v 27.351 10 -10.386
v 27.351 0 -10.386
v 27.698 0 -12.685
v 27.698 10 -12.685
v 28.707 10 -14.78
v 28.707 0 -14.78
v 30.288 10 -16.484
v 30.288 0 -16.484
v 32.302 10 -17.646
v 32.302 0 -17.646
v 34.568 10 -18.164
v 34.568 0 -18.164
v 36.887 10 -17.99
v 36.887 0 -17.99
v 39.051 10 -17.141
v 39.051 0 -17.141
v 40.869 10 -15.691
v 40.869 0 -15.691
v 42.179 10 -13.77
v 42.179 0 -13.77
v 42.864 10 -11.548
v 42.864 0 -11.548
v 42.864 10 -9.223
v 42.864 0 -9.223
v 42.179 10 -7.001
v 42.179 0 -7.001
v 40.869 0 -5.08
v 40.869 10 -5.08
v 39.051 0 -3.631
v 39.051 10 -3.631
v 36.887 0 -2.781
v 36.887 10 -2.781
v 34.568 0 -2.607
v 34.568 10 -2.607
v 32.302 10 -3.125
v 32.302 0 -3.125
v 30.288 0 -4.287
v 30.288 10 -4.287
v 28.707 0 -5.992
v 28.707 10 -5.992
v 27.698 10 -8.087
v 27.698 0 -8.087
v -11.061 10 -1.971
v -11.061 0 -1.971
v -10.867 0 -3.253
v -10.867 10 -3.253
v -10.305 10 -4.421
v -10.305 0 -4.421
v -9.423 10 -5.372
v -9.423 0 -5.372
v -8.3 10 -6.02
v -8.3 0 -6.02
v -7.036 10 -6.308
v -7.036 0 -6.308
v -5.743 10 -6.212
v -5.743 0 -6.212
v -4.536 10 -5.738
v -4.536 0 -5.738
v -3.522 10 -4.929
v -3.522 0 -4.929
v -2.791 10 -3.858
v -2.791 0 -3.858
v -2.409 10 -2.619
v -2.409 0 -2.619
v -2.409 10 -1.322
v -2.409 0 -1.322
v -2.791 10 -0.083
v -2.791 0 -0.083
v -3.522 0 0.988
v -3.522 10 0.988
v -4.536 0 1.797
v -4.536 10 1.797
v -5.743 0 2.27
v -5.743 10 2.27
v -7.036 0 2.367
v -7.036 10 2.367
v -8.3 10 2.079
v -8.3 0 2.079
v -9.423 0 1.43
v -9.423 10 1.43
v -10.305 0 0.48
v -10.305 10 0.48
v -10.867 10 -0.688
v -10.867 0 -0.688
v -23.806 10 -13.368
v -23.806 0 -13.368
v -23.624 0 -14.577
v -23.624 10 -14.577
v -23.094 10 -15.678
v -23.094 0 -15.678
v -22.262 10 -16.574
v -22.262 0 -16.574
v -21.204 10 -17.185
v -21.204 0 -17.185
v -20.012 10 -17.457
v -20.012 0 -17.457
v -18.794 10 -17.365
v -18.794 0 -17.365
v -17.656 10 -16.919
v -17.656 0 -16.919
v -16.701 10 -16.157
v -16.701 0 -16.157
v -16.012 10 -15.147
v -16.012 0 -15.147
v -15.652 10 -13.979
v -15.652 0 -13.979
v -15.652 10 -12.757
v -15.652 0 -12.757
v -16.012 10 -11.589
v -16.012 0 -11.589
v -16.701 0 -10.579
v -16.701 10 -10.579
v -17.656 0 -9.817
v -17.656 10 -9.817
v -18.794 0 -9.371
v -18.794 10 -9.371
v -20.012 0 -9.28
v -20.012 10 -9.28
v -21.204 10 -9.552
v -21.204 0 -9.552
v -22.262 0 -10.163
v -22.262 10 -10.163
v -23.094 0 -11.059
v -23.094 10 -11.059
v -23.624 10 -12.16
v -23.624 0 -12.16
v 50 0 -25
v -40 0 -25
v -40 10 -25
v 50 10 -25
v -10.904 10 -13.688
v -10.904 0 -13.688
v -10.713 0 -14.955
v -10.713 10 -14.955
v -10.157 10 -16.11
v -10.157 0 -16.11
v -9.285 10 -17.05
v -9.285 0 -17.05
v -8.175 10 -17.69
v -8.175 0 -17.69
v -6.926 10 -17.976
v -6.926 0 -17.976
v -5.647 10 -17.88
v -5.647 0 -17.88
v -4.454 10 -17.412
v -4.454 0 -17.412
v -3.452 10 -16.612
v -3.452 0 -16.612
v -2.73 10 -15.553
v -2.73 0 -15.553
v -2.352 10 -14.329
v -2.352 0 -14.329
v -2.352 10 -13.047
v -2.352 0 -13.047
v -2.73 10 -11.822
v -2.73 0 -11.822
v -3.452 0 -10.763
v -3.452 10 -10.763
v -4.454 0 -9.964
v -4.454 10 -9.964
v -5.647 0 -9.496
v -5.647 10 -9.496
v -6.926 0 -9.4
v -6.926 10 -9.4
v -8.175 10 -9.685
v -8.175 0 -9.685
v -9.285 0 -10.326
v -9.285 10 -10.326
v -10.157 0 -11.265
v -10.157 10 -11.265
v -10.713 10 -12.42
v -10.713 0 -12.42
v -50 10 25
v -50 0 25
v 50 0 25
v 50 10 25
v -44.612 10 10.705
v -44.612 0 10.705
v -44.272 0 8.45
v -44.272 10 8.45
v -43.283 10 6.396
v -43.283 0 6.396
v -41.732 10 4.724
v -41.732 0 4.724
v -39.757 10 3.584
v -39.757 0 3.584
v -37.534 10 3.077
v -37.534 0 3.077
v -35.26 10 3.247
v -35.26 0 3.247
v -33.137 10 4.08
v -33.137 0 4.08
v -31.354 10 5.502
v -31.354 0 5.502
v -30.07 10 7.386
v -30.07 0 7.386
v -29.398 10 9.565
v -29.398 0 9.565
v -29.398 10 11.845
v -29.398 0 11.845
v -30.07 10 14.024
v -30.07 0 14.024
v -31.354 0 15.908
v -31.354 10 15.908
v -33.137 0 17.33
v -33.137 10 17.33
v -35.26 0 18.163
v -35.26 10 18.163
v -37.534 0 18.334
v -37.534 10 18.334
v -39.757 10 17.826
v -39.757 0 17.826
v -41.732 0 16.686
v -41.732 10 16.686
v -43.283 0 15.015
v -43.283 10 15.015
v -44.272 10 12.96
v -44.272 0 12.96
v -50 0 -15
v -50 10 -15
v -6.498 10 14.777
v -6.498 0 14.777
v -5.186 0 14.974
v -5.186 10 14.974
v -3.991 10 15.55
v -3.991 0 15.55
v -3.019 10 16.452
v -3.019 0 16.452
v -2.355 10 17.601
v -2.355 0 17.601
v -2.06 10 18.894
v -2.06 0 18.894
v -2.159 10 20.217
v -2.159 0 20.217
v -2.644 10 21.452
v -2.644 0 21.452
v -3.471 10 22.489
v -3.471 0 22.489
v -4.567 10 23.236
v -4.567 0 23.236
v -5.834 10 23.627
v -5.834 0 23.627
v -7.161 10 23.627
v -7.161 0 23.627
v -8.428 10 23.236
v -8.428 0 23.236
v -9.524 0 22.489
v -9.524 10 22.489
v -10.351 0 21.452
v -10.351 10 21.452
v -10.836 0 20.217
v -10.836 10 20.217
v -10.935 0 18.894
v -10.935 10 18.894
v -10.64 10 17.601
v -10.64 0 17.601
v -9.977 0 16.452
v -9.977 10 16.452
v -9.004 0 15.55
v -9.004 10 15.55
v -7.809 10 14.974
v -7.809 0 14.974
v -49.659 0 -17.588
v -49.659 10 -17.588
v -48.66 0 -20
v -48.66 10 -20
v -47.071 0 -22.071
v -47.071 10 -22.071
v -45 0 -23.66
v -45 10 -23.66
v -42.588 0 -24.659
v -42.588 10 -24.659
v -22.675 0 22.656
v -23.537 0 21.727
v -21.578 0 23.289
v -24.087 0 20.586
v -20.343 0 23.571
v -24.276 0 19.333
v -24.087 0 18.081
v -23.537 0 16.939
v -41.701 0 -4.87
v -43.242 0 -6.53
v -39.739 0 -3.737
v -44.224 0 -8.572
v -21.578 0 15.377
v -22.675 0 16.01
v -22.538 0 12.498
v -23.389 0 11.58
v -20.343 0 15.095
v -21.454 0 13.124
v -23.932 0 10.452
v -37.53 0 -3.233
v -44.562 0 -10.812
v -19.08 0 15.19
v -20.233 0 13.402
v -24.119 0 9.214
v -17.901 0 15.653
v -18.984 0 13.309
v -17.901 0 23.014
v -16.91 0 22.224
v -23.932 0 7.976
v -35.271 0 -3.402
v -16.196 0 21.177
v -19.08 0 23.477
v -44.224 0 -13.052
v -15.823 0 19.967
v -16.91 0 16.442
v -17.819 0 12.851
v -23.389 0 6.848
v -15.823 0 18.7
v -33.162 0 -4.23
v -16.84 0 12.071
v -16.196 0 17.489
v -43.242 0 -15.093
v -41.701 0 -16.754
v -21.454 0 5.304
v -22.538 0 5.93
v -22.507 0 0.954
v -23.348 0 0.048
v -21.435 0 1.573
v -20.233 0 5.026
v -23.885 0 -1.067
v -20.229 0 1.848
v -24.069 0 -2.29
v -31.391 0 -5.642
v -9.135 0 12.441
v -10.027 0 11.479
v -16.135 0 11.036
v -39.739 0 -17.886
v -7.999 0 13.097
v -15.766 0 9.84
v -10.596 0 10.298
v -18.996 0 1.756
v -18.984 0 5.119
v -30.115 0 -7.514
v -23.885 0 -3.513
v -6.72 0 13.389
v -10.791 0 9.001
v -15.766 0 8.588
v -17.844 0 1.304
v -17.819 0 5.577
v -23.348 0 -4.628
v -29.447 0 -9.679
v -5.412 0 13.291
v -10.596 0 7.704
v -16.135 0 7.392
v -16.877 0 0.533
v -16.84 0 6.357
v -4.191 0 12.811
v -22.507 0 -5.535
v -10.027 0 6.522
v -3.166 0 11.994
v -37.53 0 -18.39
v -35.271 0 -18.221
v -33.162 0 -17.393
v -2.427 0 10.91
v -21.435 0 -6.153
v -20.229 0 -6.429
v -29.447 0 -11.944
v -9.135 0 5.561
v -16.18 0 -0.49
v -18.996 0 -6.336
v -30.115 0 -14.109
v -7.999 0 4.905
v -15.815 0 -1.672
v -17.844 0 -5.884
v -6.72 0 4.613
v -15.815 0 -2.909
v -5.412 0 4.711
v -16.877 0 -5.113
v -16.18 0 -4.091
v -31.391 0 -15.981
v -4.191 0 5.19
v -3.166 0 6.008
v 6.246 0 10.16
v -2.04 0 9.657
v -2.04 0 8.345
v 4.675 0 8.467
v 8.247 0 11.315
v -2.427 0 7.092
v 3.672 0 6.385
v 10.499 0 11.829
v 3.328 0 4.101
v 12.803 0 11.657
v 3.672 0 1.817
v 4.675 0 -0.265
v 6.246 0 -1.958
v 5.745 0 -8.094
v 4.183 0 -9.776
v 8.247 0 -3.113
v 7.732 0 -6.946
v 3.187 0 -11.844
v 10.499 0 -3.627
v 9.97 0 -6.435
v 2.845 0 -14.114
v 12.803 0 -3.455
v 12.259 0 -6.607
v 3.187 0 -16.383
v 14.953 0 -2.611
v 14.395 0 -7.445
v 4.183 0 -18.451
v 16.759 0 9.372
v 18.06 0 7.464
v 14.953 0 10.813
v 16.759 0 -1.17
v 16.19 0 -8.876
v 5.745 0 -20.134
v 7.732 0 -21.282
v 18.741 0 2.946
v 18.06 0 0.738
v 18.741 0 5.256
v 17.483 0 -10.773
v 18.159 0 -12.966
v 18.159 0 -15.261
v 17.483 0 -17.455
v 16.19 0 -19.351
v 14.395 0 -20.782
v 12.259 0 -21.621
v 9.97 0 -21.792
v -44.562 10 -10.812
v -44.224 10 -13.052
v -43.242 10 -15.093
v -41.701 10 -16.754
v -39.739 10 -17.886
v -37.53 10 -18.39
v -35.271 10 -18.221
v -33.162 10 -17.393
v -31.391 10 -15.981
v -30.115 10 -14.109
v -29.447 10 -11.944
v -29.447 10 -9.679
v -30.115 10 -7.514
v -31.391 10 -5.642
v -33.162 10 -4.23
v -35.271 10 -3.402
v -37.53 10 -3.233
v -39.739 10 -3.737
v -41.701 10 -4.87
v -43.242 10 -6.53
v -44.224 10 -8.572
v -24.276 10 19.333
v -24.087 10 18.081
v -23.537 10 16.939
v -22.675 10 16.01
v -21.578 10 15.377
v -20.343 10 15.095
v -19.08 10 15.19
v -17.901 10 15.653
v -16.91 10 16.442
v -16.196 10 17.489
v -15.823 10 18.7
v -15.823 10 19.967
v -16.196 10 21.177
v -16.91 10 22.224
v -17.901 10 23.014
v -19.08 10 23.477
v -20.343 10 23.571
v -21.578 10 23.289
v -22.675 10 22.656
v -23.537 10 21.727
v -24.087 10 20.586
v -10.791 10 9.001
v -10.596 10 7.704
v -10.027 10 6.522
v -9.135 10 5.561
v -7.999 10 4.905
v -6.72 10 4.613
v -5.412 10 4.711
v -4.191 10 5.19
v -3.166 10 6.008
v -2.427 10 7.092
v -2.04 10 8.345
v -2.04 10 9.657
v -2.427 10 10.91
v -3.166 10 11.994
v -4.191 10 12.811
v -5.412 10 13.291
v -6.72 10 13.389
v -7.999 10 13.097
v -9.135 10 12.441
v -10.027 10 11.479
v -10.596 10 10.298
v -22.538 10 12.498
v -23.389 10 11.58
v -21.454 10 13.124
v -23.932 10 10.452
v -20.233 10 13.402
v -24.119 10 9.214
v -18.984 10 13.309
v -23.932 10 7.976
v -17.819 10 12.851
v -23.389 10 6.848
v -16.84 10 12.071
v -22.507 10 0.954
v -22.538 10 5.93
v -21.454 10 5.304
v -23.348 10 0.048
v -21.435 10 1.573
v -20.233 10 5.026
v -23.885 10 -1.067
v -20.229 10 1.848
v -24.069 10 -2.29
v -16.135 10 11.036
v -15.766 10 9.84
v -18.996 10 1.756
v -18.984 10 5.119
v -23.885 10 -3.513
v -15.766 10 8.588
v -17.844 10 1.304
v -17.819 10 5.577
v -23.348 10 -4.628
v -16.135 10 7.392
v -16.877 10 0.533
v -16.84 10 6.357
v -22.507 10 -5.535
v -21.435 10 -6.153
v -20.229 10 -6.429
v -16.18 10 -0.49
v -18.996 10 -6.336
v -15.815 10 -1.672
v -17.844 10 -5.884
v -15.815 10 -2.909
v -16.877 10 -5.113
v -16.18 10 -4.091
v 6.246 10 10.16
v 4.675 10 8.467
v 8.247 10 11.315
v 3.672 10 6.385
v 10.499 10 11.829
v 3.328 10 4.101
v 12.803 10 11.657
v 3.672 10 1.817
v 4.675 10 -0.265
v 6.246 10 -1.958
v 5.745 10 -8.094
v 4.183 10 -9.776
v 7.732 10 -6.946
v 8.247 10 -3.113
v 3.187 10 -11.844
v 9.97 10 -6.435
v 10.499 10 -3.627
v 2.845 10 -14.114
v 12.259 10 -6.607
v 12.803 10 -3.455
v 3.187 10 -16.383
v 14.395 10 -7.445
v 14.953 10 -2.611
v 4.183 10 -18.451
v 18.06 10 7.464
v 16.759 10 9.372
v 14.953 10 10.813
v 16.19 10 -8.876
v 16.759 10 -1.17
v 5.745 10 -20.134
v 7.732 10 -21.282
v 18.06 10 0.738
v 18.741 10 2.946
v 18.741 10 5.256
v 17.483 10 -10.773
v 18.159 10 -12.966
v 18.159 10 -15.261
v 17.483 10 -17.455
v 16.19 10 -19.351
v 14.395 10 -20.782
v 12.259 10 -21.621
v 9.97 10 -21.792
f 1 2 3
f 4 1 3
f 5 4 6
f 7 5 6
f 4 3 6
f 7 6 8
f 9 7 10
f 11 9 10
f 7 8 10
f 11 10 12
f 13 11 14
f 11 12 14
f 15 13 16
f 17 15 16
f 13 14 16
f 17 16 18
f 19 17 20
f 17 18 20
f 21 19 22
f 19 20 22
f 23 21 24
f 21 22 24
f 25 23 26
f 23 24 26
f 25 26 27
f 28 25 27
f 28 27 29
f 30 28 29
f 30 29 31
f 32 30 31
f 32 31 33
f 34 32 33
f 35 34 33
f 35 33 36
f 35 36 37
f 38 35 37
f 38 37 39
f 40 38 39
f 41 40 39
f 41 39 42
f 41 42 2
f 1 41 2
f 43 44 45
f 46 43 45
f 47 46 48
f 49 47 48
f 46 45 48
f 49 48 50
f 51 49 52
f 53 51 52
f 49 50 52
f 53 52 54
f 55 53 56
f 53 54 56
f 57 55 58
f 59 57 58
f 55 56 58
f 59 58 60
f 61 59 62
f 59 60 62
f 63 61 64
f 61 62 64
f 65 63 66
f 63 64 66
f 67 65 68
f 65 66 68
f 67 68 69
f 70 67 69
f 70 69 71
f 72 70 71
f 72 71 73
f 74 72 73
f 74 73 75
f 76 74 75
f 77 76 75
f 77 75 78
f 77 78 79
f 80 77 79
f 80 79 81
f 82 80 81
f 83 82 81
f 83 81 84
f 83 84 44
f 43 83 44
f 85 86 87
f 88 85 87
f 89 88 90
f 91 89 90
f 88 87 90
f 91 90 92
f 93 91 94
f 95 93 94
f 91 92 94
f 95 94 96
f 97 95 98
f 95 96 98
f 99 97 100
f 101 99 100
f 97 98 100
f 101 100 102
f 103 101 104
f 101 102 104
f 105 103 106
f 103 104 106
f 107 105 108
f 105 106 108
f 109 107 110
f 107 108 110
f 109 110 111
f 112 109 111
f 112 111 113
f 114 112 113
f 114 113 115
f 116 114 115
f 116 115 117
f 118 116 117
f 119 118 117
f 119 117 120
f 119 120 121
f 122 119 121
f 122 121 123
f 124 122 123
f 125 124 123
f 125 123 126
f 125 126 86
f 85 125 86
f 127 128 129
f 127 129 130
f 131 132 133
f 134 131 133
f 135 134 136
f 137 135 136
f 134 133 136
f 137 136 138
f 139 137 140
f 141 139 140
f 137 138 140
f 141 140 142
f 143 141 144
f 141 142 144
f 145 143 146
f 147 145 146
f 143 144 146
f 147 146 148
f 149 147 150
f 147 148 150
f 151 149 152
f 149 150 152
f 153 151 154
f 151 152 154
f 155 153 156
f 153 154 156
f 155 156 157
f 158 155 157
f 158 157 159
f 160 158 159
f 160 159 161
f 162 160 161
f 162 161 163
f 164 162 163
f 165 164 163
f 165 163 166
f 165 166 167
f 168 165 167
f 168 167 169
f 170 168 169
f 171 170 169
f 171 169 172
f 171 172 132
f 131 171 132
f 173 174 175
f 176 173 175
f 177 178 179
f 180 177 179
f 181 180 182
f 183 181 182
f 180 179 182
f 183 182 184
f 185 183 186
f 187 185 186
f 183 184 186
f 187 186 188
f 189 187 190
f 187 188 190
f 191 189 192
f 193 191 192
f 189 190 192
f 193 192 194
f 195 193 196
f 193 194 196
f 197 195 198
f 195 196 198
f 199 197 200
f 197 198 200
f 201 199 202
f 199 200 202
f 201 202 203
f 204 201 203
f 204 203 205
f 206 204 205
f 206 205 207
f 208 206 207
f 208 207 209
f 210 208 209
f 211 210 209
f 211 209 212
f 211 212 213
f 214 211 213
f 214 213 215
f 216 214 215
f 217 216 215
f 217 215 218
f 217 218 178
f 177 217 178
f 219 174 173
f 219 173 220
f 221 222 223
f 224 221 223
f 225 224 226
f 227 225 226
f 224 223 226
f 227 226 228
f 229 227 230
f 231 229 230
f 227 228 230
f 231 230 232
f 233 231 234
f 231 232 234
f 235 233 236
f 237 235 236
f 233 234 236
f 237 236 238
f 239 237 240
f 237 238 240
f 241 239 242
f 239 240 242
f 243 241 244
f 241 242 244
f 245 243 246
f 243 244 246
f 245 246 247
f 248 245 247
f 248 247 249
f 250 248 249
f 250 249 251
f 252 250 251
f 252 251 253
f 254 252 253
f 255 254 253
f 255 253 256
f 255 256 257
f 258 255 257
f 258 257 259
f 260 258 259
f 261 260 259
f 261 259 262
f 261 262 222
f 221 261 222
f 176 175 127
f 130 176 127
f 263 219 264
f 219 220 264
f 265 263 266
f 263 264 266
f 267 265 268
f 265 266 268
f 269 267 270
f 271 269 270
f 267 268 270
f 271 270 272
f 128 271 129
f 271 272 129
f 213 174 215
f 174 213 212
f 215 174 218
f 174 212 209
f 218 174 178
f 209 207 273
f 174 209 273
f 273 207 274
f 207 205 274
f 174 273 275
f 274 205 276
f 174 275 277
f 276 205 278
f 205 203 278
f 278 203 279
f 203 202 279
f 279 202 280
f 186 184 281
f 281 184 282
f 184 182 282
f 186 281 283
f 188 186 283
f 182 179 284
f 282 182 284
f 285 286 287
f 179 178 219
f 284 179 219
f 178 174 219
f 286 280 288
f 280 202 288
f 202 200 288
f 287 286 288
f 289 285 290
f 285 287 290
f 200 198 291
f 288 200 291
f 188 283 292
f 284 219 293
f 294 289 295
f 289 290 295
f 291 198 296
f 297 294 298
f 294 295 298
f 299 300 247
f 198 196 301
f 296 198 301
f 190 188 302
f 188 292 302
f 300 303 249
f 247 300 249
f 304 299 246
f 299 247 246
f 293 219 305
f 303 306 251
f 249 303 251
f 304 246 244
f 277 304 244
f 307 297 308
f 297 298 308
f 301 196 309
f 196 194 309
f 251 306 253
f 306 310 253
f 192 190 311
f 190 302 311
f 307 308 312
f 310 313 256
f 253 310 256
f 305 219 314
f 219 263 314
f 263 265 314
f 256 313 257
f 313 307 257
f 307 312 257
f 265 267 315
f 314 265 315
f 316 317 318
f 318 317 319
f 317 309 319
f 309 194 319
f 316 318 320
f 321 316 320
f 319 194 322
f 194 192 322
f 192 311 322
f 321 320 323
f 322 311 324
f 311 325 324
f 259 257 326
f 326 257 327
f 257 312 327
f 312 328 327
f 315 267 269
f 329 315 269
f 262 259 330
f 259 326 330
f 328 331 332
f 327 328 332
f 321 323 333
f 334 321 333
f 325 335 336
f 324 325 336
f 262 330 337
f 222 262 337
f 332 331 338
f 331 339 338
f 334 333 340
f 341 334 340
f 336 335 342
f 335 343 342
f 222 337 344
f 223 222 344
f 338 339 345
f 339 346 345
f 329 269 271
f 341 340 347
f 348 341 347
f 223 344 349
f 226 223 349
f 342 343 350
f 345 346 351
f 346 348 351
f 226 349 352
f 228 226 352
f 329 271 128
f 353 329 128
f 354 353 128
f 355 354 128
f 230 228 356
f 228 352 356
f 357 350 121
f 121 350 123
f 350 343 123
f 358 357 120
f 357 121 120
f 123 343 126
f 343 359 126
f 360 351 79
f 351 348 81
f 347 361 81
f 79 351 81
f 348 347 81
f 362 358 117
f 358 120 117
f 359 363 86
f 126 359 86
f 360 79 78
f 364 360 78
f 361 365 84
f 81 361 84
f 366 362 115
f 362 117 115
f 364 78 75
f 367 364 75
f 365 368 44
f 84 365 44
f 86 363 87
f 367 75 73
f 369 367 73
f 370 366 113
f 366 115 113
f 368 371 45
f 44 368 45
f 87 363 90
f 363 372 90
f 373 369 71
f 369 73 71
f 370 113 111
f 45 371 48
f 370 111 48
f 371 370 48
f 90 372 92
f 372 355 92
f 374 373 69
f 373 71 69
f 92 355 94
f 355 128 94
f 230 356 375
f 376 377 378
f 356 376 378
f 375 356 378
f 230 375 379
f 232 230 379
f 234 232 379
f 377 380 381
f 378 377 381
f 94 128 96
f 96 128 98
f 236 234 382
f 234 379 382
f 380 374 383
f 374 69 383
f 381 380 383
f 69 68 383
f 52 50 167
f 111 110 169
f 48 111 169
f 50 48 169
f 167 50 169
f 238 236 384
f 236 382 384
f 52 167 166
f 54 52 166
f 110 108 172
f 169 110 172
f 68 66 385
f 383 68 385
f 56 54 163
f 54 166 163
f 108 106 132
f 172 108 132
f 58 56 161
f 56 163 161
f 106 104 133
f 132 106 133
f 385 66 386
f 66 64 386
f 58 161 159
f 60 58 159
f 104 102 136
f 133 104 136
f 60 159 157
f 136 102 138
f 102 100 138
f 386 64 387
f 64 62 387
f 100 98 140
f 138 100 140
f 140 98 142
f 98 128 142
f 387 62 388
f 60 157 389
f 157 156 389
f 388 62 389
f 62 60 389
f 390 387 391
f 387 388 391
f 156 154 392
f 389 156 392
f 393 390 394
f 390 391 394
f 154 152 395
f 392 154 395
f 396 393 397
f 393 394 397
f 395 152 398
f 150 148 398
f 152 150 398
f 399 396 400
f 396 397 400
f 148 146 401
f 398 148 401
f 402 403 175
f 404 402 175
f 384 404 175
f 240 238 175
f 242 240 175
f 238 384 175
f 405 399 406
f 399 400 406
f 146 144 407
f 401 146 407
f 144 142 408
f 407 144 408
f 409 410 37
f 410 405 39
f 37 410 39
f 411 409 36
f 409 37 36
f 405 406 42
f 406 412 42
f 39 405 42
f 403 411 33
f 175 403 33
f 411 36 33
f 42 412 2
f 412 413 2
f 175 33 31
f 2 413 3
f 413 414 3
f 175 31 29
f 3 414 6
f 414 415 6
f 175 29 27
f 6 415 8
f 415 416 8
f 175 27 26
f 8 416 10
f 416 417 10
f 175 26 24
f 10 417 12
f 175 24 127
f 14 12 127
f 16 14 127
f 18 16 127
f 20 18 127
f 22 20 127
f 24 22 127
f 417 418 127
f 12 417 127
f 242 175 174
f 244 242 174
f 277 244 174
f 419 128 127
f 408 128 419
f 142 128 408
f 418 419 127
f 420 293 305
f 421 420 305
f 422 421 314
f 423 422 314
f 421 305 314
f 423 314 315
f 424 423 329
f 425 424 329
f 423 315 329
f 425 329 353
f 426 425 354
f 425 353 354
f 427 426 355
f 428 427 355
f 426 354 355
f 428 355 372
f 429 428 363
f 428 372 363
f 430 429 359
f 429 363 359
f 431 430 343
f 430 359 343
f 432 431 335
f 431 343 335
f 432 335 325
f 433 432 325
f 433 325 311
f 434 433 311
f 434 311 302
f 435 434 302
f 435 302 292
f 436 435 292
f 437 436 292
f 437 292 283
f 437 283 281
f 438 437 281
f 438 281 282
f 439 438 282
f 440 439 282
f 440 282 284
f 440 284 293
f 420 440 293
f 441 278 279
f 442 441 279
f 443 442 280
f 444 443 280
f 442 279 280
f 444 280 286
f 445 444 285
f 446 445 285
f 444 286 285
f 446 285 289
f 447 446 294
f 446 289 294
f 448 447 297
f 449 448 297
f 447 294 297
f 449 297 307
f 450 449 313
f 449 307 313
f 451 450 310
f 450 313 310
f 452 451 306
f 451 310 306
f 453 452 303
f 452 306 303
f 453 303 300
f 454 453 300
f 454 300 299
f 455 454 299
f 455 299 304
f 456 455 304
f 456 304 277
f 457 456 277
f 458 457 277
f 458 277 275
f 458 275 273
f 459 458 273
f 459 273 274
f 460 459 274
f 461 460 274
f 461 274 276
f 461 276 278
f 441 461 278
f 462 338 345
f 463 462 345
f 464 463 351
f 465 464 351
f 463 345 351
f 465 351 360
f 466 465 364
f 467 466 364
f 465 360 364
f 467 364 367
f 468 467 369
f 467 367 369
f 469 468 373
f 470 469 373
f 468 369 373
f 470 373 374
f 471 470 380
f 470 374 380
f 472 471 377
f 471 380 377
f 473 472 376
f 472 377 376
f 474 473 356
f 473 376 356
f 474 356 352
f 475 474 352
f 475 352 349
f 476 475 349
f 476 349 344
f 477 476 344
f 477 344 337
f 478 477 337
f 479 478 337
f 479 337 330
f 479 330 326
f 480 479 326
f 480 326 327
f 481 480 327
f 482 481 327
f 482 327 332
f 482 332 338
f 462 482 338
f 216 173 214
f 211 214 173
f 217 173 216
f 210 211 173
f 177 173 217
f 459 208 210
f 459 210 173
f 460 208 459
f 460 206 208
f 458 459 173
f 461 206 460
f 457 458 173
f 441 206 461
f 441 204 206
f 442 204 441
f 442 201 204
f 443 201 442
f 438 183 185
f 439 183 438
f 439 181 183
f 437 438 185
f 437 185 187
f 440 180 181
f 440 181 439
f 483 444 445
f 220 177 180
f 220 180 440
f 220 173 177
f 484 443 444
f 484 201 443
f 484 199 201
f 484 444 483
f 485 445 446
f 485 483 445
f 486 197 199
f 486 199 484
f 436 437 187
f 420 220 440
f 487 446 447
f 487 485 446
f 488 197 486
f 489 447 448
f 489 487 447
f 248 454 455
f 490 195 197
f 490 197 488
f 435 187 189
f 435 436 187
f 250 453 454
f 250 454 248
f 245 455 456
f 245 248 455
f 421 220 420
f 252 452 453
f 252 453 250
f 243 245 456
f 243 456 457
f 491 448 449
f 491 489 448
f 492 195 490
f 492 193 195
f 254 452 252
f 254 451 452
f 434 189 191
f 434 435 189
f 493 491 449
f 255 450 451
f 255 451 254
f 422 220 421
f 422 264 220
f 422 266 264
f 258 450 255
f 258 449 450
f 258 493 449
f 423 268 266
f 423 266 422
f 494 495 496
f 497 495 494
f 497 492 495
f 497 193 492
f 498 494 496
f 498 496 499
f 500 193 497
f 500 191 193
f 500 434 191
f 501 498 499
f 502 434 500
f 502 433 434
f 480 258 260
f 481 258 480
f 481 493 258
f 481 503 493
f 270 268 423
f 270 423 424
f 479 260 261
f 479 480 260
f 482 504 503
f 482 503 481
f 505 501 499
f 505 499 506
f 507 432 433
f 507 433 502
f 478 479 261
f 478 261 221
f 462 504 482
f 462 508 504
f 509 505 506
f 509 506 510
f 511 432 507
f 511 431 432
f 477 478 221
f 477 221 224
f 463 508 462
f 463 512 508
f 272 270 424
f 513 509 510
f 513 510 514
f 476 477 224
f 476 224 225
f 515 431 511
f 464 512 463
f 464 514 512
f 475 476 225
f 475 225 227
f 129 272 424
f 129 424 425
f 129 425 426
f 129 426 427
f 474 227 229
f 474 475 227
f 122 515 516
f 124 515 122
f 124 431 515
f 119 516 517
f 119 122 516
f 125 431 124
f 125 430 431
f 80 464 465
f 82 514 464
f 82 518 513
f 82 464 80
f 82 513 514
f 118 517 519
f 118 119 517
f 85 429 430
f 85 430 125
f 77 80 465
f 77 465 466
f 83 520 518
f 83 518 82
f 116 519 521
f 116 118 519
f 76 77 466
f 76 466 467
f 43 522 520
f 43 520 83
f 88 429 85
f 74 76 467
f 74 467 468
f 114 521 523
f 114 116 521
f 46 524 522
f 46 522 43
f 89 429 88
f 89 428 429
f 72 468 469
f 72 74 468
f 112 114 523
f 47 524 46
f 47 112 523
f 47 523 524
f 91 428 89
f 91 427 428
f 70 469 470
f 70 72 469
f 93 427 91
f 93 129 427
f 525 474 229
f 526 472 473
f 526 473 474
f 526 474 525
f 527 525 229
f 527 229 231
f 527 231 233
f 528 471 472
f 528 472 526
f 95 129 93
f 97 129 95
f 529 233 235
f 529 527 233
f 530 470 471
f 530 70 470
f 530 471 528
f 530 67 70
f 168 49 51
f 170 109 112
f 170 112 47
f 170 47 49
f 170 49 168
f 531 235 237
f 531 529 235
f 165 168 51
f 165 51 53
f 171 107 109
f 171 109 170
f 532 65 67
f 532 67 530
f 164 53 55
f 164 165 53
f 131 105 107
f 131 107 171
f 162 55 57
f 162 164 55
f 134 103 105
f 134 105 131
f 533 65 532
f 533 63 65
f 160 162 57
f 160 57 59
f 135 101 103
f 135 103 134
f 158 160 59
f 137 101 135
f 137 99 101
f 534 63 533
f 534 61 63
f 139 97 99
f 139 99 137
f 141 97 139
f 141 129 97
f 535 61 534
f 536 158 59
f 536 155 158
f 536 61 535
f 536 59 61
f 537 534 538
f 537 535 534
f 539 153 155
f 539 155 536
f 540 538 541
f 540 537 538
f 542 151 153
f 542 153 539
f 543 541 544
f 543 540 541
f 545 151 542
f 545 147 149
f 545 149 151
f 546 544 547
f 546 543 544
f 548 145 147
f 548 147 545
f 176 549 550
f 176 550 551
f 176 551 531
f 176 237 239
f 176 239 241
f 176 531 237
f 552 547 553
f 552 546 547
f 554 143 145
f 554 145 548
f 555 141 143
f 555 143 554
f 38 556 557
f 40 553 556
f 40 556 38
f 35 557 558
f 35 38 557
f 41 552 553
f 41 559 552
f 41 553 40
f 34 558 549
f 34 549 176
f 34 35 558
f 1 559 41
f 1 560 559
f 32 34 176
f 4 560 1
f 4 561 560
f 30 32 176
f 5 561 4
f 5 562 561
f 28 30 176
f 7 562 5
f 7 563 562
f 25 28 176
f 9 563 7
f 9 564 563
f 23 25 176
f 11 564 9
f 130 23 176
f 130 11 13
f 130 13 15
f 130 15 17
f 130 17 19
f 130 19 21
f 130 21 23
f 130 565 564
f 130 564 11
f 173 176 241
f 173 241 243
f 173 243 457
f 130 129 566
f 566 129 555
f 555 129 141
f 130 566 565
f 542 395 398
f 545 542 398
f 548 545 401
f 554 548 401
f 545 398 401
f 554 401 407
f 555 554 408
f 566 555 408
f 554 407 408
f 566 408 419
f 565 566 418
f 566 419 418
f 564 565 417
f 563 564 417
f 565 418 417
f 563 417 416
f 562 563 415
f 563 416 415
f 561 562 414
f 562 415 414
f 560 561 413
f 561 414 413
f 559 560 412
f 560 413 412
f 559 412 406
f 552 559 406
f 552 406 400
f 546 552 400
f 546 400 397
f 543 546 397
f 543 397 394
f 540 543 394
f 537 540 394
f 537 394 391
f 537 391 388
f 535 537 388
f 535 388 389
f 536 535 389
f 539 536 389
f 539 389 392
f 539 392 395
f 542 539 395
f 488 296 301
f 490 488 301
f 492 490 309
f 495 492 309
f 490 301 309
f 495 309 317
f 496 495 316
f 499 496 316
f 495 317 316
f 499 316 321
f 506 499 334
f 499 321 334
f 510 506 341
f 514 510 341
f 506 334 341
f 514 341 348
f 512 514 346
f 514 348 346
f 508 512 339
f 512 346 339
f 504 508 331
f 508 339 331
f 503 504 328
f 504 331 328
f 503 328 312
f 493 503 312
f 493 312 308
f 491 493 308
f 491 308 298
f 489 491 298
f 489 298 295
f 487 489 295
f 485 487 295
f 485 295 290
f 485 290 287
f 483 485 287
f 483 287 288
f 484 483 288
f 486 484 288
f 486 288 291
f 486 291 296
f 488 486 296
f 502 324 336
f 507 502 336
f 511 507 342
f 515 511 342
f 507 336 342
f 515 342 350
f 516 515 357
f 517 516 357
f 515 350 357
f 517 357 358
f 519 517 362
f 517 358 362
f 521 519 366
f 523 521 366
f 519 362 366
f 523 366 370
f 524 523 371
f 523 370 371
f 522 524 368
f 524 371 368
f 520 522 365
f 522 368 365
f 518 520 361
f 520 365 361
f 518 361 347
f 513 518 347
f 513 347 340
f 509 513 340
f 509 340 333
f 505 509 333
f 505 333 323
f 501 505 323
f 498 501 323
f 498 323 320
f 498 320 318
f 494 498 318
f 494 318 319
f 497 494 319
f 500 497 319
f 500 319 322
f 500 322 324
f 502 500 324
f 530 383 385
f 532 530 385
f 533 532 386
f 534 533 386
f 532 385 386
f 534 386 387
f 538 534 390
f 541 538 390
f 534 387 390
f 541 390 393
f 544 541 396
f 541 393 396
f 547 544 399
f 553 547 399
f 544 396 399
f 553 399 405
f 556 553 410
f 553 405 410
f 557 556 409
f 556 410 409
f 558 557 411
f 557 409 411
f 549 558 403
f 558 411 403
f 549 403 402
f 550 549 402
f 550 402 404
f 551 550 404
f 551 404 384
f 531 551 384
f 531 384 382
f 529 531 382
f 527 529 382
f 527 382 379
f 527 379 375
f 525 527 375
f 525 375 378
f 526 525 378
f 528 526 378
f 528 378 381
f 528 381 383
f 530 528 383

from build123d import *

# Parameters (mm, degrees)
SKETCH1_W              = 100
SKETCH1_H              = 50
BOSS_EXTRUDE1_DEPTH    = 10
FILLET1_R              = 10
F_1_0MM_DOWEL_HOLE1_D  = 15.2
F_1_0MM_DOWEL_HOLE2_D  = 15.3
F_1_0MM_DOWEL_HOLE3_D  = 8.2
F_1_0MM_DOWEL_HOLE4_D  = 8.3
F_1_0MM_DOWEL_HOLE5_D  = 8.4
F_1_0MM_DOWEL_HOLE6_D  = 8.5
F_1_0MM_DOWEL_HOLE7_D  = 8.6
F_1_0MM_DOWEL_HOLE8_D  = 8.7
F_1_0MM_DOWEL_HOLE9_D  = 8.8
F_1_0MM_DOWEL_HOLE10_D = 8.9
F_1_0MM_DOWEL_HOLE11_D = 15.4
F_1_0MM_DOWEL_HOLE12_D = 15.5
F_1_0MM_DOWEL_HOLE13_D = 15.6


with BuildPart() as part:
    # Sketch1 → Boss-Extrude1 (new body)
    with BuildSketch(Plane(origin=(0, 0, 0), x_dir=(1, 0, 0), z_dir=(0, 1, 0))):
        Rectangle(SKETCH1_W, SKETCH1_H)
    extrude(amount=BOSS_EXTRUDE1_DEPTH)

    # Fillet1
    fillet1_edges = [part.edges().sort_by_distance(p)[0] for p in [
        (-50, 5, -25),
    ]]
    fillet(fillet1_edges, radius=FILLET1_R)

    # Ø1.0mm Dowel Hole1 (through all)
    with Locations(Plane(origin=(0, 10, 0), x_dir=(1, 0, 0), z_dir=(0, 1, 0))):
        with Locations((-36.962140768, 10.811692473)):
            Hole(F_1_0MM_DOWEL_HOLE1_D / 2)

    # Ø1.0mm Dowel Hole2 (through all)
    with Locations(Plane(origin=(0, 10, 0), x_dir=(1, 0, 0), z_dir=(0, 1, 0))):
        with Locations((-36.962140768, -10.705173335)):
            Hole(F_1_0MM_DOWEL_HOLE2_D / 2)

    # Ø1.0mm Dowel Hole3 (through all)
    with Locations(Plane(origin=(0, 10, 0), x_dir=(1, 0, 0), z_dir=(0, 1, 0))):
        with Locations((-19.706040467, 13.368151776)):
            Hole(F_1_0MM_DOWEL_HOLE3_D / 2)

    # Ø1.0mm Dowel Hole4 (through all)
    with Locations(Plane(origin=(0, 10, 0), x_dir=(1, 0, 0), z_dir=(0, 1, 0))):
        with Locations((-19.919078743, 2.29016146)):
            Hole(F_1_0MM_DOWEL_HOLE4_D / 2)

    # Ø1.0mm Dowel Hole5 (through all)
    with Locations(Plane(origin=(0, 10, 0), x_dir=(1, 0, 0), z_dir=(0, 1, 0))):
        with Locations((-19.919078743, -9.213905408)):
            Hole(F_1_0MM_DOWEL_HOLE5_D / 2)

    # Ø1.0mm Dowel Hole6 (through all)
    with Locations(Plane(origin=(0, 10, 0), x_dir=(1, 0, 0), z_dir=(0, 1, 0))):
        with Locations((-20.02559788, -19.333223485)):
            Hole(F_1_0MM_DOWEL_HOLE6_D / 2)

    # Ø1.0mm Dowel Hole7 (through all)
    with Locations(Plane(origin=(0, 10, 0), x_dir=(1, 0, 0), z_dir=(0, 1, 0))):
        with Locations((-6.604186535, 13.687709189)):
            Hole(F_1_0MM_DOWEL_HOLE7_D / 2)

    # Ø1.0mm Dowel Hole8 (through all)
    with Locations(Plane(origin=(0, 10, 0), x_dir=(1, 0, 0), z_dir=(0, 1, 0))):
        with Locations((-6.710705673, 1.970604047)):
            Hole(F_1_0MM_DOWEL_HOLE8_D / 2)

    # Ø1.0mm Dowel Hole9 (through all)
    with Locations(Plane(origin=(0, 10, 0), x_dir=(1, 0, 0), z_dir=(0, 1, 0))):
        with Locations((-6.39114826, -9.000867132)):
            Hole(F_1_0MM_DOWEL_HOLE9_D / 2)

    # Ø1.0mm Dowel Hole10 (through all)
    with Locations(Plane(origin=(-6.497667397, 10, 19.226704348), x_dir=(0, 0, 1), z_dir=(0, 1, 0))):
        with Locations((0, 0)):
            Hole(F_1_0MM_DOWEL_HOLE10_D / 2)

    # Ø1.0mm Dowel Hole11 (through all)
    with Locations(Plane(origin=(0, 10, 0), x_dir=(1, 0, 0), z_dir=(0, 1, 0))):
        with Locations((10.545394628, 14.11378574)):
            Hole(F_1_0MM_DOWEL_HOLE11_D / 2)

    # Ø1.0mm Dowel Hole12 (through all)
    with Locations(Plane(origin=(0, 10, 0), x_dir=(1, 0, 0), z_dir=(0, 1, 0))):
        with Locations((11.077990317, -4.1009868)):
            Hole(F_1_0MM_DOWEL_HOLE12_D / 2)

    # Ø1.0mm Dowel Hole13 (through all)
    with Locations(Plane(origin=(0, 10, 0), x_dir=(1, 0, 0), z_dir=(0, 1, 0))):
        with Locations((35.151315428, 10.385615922)):
            Hole(F_1_0MM_DOWEL_HOLE13_D / 2)


solid = part.part
